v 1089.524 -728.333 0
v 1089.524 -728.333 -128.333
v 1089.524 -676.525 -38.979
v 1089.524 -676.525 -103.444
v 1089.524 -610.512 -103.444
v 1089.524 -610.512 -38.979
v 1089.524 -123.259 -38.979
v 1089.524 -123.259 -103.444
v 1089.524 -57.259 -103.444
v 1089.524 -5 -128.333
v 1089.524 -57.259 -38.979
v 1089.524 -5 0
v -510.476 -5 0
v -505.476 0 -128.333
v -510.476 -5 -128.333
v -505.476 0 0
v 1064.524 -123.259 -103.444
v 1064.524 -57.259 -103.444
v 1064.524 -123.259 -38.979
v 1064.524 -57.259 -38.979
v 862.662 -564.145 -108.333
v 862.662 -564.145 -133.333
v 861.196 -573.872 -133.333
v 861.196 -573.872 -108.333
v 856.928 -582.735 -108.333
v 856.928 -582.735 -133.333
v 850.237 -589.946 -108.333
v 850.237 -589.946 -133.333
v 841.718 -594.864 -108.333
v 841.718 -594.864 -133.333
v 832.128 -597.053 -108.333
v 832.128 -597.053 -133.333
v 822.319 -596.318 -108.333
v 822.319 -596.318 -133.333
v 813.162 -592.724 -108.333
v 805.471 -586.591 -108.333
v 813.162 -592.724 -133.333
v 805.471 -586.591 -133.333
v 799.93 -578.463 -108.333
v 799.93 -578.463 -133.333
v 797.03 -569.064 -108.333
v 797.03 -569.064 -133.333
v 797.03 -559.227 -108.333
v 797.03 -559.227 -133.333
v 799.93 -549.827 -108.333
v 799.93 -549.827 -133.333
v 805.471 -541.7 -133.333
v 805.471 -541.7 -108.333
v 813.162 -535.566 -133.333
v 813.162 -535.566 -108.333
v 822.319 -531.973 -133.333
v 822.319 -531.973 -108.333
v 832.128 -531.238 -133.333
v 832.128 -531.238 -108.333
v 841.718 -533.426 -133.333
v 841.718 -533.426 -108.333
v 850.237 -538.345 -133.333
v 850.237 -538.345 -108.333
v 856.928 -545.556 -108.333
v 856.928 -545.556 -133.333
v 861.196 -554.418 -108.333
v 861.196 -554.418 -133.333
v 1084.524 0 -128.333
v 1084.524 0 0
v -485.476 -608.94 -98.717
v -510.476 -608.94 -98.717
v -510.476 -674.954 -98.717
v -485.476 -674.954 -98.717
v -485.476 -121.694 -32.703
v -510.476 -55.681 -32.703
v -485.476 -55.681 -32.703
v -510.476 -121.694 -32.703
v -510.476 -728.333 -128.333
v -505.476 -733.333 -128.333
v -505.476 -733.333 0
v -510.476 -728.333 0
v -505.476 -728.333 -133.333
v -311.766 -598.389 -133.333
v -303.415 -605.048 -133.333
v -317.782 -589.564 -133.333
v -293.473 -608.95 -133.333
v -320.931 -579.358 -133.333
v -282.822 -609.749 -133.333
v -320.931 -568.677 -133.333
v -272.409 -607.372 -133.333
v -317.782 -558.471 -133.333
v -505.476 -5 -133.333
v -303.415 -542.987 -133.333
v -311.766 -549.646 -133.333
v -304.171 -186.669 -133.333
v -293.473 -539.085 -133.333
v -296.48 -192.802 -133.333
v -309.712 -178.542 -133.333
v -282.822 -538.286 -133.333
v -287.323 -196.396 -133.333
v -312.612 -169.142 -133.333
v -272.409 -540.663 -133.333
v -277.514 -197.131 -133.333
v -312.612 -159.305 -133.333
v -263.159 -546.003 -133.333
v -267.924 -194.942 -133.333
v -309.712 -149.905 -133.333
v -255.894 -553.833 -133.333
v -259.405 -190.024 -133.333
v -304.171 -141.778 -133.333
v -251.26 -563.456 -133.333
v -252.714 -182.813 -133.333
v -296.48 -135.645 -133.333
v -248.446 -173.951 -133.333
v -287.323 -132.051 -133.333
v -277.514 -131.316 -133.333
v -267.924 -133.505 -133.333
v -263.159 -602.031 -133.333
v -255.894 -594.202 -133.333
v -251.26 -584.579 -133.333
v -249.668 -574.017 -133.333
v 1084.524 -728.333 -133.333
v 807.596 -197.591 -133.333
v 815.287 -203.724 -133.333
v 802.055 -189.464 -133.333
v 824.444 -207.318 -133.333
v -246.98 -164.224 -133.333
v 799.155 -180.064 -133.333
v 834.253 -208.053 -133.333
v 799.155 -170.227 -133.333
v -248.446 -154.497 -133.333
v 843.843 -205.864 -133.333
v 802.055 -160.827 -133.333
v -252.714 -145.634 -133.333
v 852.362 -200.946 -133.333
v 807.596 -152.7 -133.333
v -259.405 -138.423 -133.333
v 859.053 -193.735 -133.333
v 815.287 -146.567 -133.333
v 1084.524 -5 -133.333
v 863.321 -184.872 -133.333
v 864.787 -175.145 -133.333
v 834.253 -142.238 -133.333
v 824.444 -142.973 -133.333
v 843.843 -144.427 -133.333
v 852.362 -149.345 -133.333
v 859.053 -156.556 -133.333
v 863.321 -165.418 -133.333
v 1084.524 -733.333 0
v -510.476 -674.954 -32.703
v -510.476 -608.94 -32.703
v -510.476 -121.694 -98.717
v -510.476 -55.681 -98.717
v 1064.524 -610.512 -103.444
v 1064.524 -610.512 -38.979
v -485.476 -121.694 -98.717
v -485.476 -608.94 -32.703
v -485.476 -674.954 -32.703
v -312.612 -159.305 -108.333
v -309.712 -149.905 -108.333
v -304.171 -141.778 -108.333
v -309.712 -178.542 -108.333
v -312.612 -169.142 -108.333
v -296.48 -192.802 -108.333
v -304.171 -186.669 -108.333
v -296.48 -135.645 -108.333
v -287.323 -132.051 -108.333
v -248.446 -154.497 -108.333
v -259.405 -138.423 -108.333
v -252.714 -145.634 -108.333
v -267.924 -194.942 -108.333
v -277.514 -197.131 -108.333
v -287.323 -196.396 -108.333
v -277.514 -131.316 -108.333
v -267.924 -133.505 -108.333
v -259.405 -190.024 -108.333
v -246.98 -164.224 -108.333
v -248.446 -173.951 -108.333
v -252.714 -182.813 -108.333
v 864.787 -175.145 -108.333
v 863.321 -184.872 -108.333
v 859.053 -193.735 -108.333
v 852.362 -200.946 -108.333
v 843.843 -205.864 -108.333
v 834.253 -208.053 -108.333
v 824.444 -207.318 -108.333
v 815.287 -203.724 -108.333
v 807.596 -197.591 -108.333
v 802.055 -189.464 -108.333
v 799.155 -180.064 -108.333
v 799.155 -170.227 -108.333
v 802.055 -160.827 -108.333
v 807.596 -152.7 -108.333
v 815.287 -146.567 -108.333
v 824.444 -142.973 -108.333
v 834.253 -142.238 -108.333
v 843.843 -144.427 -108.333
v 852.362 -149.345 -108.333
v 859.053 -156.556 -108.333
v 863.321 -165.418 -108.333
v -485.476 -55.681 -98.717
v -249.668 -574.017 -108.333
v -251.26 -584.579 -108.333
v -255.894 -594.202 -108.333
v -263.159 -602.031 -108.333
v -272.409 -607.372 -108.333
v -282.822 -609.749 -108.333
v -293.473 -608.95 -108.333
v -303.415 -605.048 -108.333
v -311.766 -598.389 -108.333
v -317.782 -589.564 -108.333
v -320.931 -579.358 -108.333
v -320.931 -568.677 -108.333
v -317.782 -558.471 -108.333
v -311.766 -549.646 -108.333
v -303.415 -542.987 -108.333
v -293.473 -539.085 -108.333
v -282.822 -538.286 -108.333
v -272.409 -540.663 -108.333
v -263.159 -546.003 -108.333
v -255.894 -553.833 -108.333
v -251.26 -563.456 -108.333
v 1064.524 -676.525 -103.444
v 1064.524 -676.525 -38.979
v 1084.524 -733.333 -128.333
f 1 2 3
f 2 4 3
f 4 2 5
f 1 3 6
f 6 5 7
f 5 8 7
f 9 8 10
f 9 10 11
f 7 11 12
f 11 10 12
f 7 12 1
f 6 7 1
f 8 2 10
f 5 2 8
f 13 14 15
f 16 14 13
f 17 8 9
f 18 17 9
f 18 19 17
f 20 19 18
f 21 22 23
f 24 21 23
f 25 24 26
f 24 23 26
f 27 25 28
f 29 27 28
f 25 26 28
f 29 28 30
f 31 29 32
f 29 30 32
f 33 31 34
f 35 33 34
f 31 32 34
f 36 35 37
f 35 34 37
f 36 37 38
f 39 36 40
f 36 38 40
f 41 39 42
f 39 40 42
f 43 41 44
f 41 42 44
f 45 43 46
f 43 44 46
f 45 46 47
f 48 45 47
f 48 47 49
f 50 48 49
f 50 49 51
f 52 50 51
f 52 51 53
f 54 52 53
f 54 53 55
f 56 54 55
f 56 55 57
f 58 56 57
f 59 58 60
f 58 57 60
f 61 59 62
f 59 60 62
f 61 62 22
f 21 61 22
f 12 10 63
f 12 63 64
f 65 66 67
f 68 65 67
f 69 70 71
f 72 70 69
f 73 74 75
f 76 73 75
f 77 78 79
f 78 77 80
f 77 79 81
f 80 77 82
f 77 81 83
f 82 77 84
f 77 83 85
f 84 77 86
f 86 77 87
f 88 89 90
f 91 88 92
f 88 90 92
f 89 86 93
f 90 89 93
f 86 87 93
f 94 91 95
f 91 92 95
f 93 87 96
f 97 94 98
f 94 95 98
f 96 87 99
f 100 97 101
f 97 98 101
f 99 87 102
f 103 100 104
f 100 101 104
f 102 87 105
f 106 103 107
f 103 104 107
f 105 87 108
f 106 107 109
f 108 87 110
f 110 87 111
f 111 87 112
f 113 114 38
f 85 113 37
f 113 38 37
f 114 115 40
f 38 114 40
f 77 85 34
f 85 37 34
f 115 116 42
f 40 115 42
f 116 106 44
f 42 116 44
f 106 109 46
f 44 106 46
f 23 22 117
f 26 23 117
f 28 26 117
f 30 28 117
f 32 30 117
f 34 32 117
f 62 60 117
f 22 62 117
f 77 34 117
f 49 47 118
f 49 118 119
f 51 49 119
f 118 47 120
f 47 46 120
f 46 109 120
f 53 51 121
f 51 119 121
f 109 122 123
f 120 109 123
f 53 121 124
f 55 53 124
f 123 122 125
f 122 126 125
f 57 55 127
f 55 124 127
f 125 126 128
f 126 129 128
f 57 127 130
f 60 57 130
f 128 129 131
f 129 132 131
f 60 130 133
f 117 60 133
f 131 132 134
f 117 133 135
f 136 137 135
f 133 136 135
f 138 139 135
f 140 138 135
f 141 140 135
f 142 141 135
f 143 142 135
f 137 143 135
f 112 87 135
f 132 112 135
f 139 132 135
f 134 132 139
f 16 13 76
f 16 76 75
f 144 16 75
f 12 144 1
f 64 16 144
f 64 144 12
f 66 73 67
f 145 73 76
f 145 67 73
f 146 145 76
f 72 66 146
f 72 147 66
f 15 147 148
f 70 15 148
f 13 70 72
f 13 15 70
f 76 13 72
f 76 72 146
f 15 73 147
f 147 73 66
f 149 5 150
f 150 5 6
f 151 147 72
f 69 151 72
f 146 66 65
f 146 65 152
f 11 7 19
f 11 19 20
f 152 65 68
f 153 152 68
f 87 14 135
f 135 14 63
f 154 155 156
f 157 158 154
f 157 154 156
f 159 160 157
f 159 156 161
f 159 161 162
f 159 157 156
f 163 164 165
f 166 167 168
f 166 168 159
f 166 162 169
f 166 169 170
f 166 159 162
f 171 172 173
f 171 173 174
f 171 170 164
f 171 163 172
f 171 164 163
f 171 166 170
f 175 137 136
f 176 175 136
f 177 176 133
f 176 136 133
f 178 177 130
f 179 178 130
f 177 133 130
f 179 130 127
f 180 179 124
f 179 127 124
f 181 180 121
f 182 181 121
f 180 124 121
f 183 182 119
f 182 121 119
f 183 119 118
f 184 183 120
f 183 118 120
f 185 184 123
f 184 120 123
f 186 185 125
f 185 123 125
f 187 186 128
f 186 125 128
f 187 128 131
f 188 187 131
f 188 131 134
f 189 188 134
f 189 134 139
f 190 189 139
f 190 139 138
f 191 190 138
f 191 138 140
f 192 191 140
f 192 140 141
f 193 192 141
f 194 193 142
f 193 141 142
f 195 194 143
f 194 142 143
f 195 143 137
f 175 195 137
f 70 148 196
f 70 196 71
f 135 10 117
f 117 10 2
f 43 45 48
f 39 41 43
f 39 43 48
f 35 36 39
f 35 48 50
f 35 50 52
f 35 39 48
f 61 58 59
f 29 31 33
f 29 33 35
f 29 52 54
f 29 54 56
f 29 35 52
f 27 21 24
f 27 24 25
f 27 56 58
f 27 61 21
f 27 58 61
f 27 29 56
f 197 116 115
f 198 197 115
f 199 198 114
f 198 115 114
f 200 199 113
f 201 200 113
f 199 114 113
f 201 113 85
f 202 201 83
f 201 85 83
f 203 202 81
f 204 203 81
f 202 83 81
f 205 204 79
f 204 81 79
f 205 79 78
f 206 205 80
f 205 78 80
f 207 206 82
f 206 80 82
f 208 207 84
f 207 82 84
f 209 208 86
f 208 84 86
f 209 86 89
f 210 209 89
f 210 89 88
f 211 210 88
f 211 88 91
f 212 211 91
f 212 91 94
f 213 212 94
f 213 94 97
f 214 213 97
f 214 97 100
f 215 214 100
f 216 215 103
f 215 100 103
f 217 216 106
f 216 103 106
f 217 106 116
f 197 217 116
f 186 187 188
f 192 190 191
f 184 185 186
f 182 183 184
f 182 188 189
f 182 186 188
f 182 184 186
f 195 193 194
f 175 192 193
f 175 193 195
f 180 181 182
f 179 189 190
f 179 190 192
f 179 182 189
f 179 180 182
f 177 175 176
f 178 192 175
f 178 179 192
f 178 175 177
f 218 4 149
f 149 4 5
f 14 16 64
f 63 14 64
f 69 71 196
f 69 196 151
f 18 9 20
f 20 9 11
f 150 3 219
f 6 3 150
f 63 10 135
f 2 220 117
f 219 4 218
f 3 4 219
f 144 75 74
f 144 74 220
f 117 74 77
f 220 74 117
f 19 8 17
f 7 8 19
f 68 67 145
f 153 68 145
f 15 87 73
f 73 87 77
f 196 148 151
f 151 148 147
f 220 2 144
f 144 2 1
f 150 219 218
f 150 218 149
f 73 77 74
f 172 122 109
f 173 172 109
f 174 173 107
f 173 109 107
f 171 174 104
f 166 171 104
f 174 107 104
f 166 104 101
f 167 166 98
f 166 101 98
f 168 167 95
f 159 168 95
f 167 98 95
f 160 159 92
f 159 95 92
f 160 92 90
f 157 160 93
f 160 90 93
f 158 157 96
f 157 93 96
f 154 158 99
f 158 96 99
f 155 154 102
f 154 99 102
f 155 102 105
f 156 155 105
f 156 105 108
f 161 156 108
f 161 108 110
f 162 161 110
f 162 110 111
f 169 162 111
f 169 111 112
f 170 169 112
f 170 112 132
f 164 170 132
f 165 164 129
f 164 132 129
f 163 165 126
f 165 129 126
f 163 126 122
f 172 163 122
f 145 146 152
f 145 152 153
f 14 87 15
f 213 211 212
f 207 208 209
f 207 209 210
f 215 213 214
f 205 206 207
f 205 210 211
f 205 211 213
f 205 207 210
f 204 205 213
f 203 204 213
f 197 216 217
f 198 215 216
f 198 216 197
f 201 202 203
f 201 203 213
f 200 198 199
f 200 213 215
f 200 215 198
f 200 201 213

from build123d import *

# Parameters (mm, degrees)
F0_W     = 1600
F0_H     = 133.333333
F1_DEPTH = 733.33333
F2_W     = 66.013813
F2_H     = 66.013888
F2_W_2   = 66.013865
F3_DEPTH = 25
F4_W     = 66.013933
F4_H     = 64.465052
F4_W_2   = 66
F5_DEPTH = 25
F6_R     = 33
F6_R_2   = 35.83127
F7_DEPTH = 25
F8_SIZE  = 5


with BuildPart() as f1:
    # F0 (on Front) → F1 (new body)
    with BuildSketch(Plane.XZ):
        with Locations((289.523828, -66.666666)):
            Rectangle(F0_W, F0_H)
    extrude(amount=F1_DEPTH)

    # F2 (on face) → F3 (cut)
    with BuildSketch(Plane(origin=(-510.476172, 0, 0), x_dir=(0, -1, 0), z_dir=(-1, 0, 0))):
        with Locations((641.946792, -65.710075)):
            Rectangle(F2_W, F2_H)
        with Locations((88.687494, -65.710075)):
            Rectangle(F2_W_2, F2_H)
    extrude(amount=-F3_DEPTH, mode=Mode.SUBTRACT)

    # F4 (on face) → F5 (cut)
    with BuildSketch(Plane.YZ.offset(1089.523828)):
        with Locations((-643.518507, -71.211226)):
            Rectangle(F4_W, F4_H)
        with Locations((-90.259247, -71.211226)):
            Rectangle(F4_W_2, F4_H)
    extrude(amount=-F5_DEPTH, mode=Mode.SUBTRACT)

    # F6 (on face) → F7 (cut)
    with BuildSketch(Plane(origin=(0, 0, -133.333333), x_dir=(1, 0, 0), z_dir=(0, 0, -1))):
        with Locations((829.661692, 564.145236)):
            Circle(F6_R)
        with Locations((831.78674, 175.145387)):
            Circle(F6_R)
        with Locations((-279.980277, 164.223653)):
            Circle(F6_R)
        with Locations((-285.49944, 574.017474)):
            Circle(F6_R_2)
    extrude(amount=-F7_DEPTH, mode=Mode.SUBTRACT)

    # F8
    f8_edges = [f1.edges().sort_by_distance(p)[0] for p in [
        (289.523828, -733.33333, -133.333333),
        (1089.523828, -733.33333, -66.666667),
        (1089.523828, -366.666665, -133.333333),
        (1089.523828, 0, -66.666667),
        (289.523828, 0, -133.333333),
        (-510.476172, -366.666665, -133.333333),
        (-510.476172, 0, -66.666667),
        (-510.476172, -733.33333, -66.666667),
    ]]
    chamfer(f8_edges, length=F8_SIZE)


solid = f1.part
